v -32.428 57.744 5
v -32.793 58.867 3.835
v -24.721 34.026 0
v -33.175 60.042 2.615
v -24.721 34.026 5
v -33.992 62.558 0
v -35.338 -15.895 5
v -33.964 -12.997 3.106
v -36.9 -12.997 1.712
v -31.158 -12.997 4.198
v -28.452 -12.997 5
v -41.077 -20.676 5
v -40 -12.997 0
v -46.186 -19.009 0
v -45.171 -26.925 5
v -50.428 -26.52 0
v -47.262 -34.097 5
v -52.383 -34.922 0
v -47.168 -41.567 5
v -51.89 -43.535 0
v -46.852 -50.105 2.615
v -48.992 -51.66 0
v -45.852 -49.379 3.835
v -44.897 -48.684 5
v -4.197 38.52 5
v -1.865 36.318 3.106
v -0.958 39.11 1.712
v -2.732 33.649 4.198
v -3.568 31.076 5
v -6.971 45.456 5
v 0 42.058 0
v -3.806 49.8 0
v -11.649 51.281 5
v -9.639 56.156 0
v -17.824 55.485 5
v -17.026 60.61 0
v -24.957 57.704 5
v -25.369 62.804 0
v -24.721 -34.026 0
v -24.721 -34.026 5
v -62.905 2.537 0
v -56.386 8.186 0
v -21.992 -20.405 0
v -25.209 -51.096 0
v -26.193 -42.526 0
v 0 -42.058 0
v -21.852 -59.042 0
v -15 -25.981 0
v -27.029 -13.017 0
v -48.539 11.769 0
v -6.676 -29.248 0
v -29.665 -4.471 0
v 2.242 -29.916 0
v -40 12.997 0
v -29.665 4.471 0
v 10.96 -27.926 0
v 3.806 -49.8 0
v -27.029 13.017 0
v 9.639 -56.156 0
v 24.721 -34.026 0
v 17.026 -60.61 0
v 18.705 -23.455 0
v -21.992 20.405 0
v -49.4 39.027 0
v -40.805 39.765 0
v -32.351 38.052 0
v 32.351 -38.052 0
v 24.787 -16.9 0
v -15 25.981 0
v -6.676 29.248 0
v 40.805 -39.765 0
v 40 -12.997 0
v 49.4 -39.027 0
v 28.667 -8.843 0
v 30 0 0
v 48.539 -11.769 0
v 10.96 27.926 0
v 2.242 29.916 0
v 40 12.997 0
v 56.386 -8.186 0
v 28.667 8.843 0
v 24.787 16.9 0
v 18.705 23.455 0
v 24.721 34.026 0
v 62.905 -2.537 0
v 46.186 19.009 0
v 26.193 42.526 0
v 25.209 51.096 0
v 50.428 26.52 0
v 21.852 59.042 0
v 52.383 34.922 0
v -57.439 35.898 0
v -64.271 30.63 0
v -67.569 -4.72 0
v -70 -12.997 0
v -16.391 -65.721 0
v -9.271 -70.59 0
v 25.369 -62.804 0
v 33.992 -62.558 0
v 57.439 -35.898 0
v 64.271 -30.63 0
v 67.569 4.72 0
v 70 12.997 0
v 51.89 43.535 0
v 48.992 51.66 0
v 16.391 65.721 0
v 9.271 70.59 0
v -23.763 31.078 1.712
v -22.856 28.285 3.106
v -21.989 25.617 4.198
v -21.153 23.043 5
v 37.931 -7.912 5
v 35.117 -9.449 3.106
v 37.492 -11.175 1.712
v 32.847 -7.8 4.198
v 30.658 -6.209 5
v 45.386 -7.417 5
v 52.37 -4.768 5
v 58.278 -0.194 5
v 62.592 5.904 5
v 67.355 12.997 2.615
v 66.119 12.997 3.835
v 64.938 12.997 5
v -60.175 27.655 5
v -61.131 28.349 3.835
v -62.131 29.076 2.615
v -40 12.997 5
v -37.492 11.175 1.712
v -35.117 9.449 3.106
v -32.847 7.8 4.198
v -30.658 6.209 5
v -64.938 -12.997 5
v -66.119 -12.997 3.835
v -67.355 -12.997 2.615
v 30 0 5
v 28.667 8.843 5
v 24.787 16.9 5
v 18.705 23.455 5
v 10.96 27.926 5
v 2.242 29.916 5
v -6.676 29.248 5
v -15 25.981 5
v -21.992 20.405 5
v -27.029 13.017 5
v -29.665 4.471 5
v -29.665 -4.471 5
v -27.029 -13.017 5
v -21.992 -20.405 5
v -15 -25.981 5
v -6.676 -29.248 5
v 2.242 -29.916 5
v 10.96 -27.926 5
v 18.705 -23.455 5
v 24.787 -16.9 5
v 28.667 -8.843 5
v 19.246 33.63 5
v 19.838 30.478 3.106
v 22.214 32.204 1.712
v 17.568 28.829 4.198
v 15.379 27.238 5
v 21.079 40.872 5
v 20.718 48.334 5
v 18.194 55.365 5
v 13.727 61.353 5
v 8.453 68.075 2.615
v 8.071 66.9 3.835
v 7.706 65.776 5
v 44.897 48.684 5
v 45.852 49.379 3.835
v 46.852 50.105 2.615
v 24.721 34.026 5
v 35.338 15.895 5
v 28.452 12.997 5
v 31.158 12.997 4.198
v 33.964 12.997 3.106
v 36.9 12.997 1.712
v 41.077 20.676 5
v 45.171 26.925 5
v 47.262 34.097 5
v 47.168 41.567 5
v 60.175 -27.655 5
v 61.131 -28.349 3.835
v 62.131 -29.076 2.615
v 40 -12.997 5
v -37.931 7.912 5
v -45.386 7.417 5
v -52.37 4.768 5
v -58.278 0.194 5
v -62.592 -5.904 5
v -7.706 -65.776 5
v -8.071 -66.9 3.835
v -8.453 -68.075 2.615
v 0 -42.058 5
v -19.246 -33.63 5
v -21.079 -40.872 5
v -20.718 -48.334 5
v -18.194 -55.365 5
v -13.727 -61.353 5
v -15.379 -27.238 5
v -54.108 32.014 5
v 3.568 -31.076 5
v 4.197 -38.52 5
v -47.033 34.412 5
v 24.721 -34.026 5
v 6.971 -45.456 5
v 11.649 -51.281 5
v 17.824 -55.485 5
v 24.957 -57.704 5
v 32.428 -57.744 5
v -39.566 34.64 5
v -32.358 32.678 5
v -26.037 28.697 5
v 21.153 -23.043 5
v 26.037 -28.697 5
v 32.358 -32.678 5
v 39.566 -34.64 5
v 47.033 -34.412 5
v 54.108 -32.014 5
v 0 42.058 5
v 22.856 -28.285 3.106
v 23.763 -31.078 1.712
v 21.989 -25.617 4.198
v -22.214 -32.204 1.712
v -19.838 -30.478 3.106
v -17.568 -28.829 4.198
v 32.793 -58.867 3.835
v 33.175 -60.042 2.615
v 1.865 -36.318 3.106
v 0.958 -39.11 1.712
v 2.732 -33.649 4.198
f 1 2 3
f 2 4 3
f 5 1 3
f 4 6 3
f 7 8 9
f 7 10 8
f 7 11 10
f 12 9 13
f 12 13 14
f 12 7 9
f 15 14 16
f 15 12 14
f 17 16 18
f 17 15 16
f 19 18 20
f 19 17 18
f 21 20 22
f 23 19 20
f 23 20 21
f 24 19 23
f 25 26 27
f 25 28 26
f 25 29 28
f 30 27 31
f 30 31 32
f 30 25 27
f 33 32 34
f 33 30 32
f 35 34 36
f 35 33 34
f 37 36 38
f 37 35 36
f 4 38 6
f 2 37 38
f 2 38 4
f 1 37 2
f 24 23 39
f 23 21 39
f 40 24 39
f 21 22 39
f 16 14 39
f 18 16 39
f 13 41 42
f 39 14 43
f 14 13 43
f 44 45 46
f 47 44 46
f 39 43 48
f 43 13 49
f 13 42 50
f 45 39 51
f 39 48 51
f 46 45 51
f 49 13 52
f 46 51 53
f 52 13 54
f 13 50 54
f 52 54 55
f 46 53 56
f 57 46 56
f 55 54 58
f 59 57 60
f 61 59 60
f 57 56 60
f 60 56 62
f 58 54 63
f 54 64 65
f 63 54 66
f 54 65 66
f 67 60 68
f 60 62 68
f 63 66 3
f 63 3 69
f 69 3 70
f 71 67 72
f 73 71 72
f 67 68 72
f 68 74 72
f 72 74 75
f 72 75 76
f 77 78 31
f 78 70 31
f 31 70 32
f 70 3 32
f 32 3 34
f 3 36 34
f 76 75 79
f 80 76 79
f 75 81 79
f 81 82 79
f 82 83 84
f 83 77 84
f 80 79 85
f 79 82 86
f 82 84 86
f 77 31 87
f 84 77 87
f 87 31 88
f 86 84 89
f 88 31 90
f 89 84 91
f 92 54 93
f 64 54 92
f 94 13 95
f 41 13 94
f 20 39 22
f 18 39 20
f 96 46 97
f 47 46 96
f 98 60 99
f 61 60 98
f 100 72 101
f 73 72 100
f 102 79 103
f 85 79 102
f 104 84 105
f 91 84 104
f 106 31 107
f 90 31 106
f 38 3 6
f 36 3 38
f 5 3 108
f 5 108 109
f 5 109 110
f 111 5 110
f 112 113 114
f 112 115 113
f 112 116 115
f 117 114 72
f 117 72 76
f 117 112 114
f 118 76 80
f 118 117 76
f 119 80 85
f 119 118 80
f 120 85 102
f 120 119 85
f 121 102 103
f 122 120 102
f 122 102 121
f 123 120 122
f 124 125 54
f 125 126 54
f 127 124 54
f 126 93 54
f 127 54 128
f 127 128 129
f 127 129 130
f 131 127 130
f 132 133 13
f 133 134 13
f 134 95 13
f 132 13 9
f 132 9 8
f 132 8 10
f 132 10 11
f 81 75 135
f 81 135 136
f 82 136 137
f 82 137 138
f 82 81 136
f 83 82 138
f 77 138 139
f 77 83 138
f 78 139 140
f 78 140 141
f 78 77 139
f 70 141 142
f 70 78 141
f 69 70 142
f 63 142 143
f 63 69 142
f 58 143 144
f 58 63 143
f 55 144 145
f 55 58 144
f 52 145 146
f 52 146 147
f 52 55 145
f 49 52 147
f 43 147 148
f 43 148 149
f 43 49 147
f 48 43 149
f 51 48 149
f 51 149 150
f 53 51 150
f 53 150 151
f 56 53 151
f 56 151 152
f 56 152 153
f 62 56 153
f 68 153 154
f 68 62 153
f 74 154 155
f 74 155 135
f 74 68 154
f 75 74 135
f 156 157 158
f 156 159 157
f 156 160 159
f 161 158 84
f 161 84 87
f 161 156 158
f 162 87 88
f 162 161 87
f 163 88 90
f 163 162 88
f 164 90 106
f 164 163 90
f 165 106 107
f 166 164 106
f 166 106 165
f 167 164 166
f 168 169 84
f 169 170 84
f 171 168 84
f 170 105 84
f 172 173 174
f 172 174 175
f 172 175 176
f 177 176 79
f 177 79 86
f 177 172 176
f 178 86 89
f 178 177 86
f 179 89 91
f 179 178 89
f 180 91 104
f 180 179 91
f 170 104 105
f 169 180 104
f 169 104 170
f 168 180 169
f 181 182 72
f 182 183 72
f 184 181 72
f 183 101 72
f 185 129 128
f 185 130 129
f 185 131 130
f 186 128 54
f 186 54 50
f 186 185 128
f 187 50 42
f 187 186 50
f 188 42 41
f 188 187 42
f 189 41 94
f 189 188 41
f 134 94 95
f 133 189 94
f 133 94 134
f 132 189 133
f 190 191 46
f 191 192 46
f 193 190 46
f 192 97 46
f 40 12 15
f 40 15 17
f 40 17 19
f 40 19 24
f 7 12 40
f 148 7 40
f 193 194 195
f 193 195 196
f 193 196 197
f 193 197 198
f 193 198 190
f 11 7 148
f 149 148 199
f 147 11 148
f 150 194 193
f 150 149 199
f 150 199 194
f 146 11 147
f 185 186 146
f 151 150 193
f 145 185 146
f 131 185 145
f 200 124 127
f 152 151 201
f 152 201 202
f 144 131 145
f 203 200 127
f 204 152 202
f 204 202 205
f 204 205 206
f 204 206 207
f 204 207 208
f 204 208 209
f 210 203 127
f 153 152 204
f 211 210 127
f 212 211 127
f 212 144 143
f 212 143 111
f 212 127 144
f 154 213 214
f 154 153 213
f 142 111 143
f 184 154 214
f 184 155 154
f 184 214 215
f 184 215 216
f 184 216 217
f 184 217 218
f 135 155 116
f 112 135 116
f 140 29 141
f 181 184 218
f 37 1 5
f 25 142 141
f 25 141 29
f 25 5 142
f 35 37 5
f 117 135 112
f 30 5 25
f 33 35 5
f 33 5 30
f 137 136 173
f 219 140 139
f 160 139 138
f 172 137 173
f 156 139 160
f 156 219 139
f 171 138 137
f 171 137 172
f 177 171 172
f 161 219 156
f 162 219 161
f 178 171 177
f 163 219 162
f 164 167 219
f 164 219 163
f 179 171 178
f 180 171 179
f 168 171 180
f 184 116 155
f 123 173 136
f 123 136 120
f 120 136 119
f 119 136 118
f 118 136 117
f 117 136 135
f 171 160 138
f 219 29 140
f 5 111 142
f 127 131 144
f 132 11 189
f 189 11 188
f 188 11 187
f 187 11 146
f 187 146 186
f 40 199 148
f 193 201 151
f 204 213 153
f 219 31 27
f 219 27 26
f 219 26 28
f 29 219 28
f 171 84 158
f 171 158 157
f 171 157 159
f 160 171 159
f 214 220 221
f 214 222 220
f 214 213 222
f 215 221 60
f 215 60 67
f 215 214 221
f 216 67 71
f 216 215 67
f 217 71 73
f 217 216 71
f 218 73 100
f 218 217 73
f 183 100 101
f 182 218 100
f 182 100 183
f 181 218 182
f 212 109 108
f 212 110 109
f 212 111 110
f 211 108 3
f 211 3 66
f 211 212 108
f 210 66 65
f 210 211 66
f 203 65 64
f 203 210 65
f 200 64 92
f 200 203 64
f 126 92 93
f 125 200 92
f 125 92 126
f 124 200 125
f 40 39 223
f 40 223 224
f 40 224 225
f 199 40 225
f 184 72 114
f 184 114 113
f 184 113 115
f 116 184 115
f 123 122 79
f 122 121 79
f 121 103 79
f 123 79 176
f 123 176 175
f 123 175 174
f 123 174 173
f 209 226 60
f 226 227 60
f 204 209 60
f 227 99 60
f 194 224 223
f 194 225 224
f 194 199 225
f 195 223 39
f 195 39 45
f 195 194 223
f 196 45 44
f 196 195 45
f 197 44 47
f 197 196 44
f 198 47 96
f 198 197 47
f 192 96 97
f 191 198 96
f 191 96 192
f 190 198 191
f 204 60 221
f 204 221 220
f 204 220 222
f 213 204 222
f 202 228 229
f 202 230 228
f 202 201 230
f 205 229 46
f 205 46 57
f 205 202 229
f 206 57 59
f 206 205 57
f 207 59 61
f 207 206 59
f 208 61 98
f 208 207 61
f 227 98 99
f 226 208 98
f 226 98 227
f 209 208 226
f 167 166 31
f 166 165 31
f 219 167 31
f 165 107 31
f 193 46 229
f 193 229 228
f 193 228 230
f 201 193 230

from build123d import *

# Parameters (mm, degrees)
F0_R         = 30
F1_DEPTH     = 5
F2_T4_ANGLE  = 130.4484876855
F2_T9_ANGLE  = 130.4484876855
F2_T14_ANGLE = 130.4484876855
F2_T19_ANGLE = 130.4484876855
F2_T24_ANGLE = 130.4484876855
F2_T29_ANGLE = 130.4484876855
F2_T34_ANGLE = 130.4484876855
F2_T39_ANGLE = 130.4484876855
F2_T44_ANGLE = 130.4484876855
F2_T49_ANGLE = 130.4484876855


# Not quite as in the source:
# - a fillet or chamfer that OpenCascade refuses, or shapes differently, is made with other operations: its cross-section is extruded or revolved along the edge and cut away or added


with BuildPart() as f1:
    # F0 (on Top) → F1 (new body)
    with BuildSketch(Plane.XY):
        with BuildLine():
            Line((-40, 12.9967878493), (-24.72135955, 34.0260323341))
            ThreePointArc((-24.72135955, 34.0260323341), (-45.1291822893, 39.7035462239), (-64.2705098312, 30.6303454181))
            Line((-64.2705098312, 30.6303454181), (-40, 12.9967878493))
        make_face()
        Polygon((40, -12.9967878493), (40, 12.9967878493), (24.72135955, 34.0260323341), (0, 42.0584889695), (-24.72135955, 34.0260323341), (-40, 12.9967878493), (-40, -12.9967878493), (-24.72135955, -34.0260323341), (0, -42.0584889695), (24.72135955, -34.0260323341), align=None)
        Circle(F0_R, mode=Mode.SUBTRACT)
        with BuildLine():
            Line((-24.72135955, 34.0260323341), (0, 42.0584889695))
            ThreePointArc((0, 42.0584889695), (-13.1731164802, 58.6471114297), (-33.9918693812, 62.5577278229))
            Line((-33.9918693812, 62.5577278229), (-24.72135955, 34.0260323341))
        make_face()
        with BuildLine():
            Line((0, 42.0584889695), (24.72135955, 34.0260323341))
            ThreePointArc((24.72135955, 34.0260323341), (23.8146320866, 55.1894734115), (9.2705098312, 70.5901844584))
            Line((9.2705098312, 70.5901844584), (0, 42.0584889695))
        make_face()
        with BuildLine():
            Line((24.72135955, 34.0260323341), (40, 12.9967878493))
            ThreePointArc((40, 12.9967878493), (51.7060006259, 30.6513323712), (48.9918693812, 51.6595899029))
            Line((48.9918693812, 51.6595899029), (24.72135955, 34.0260323341))
        make_face()
        with BuildLine():
            Line((70, 12.9967878493), (40, 12.9967878493))
            Line((40, 12.9967878493), (40, -12.9967878493))
            ThreePointArc((40, -12.9967878493), (59.8474343484, -5.5945758344), (70, 12.9967878493))
        make_face()
        with BuildLine():
            Line((64.2705098312, -30.6303454181), (40, -12.9967878493))
            Line((40, -12.9967878493), (24.72135955, -34.0260323341))
            ThreePointArc((24.72135955, -34.0260323341), (45.1291822893, -39.7035462239), (64.2705098312, -30.6303454181))
        make_face()
        with BuildLine():
            Line((33.9918693812, -62.5577278229), (24.72135955, -34.0260323341))
            Line((24.72135955, -34.0260323341), (0, -42.0584889695))
            ThreePointArc((0, -42.0584889695), (13.1731164802, -58.6471114297), (33.9918693812, -62.5577278229))
        make_face()
        with BuildLine():
            Line((-9.2705098312, -70.5901844584), (0, -42.0584889695))
            Line((0, -42.0584889695), (-24.72135955, -34.0260323341))
            ThreePointArc((-24.72135955, -34.0260323341), (-23.8146320866, -55.1894734115), (-9.2705098312, -70.5901844584))
        make_face()
        with BuildLine():
            Line((-48.9918693812, -51.6595899029), (-24.72135955, -34.0260323341))
            Line((-24.72135955, -34.0260323341), (-40, -12.9967878493))
            ThreePointArc((-40, -12.9967878493), (-51.7060006259, -30.6513323712), (-48.9918693812, -51.6595899029))
        make_face()
        with BuildLine():
            Line((-40, -12.9967878493), (-40, 12.9967878493))
            ThreePointArc((-40, 12.9967878493), (-59.8474343484, 5.5945758344), (-70, -12.9967878493))
            Line((-70, -12.9967878493), (-40, -12.9967878493))
        make_face()
    extrude(amount=F1_DEPTH)

    # F2: chamfer of 5 on 10 edges, made by hand


with BuildPart() as f2_tool2:
    # F2_s3 → F2_t4 (revolve)
    with BuildSketch(Plane(origin=(-19.7412033785, -21.6824721062, 0), x_dir=(0, 0, 1), z_dir=(0.6732302342, 0.7394329258, 0))):
        Polygon((0, 1.9388571331), (5, 6.9388571331), (5, 1.9388571331), align=None)
    revolve(axis=Axis((4.103379024, -43.3922083566, 5), (0, 0, 1)), revolution_arc=F2_T4_ANGLE)

    split(bisect_by=Plane(origin=(7.639320225, -10.5146222424, 0), x_dir=(0, 0, 1), z_dir=(0.5877852523, -0.8090169944, 0)), keep=Keep.TOP)


with BuildPart() as f1_1:
    add(f1.part)

    # F2_t1: cut F2_tool2
    add(f2_tool2.part, mode=Mode.SUBTRACT)


with BuildPart() as f2_tool7:
    # F2_s8 → F2_t9 (revolve)
    with BuildSketch(Plane(origin=(-28.7156063599, -5.9379002056, 0), x_dir=(0, 0, 1), z_dir=(0.9792824694, 0.2024990002, 0))):
        Polygon((0, 1.9388571331), (5, 6.9388571331), (5, 1.9388571331), align=None)
    revolve(axis=Axis((-22.1855967717, -37.5169396588, 5), (0, 0, 1)), revolution_arc=F2_T9_ANGLE)

    split(bisect_by=Plane.XZ.offset(12.9967878493), keep=Keep.TOP)


with BuildPart() as f1_2:
    add(f1_1.part)

    # F2_t6: cut F2_tool7
    add(f2_tool7.part, mode=Mode.SUBTRACT)


with BuildPart() as f2_tool12:
    # F2_s13 → F2_t14 (revolve)
    with BuildSketch(Plane(origin=(-26.7216237194, 12.0747477518, 0), x_dir=(0, 0, 1), z_dir=(0.911282086, -0.4117826609, 0))):
        Polygon((0, 1.9388571331), (5, 6.9388571331), (5, 1.9388571331), align=None)
    revolve(axis=Axis((-40.0004286612, -17.3114751652, 5), (0, 0, 1)), revolution_arc=F2_T14_ANGLE)

    split(bisect_by=Plane(origin=(-7.639320225, -10.5146222424, 0), x_dir=(0, 0, 1), z_dir=(-0.5877852523, -0.8090169944, 0)), keep=Keep.TOP)


with BuildPart() as f1_3:
    add(f1_2.part)

    # F2_t11: cut F2_tool12
    add(f2_tool12.part, mode=Mode.SUBTRACT)


with BuildPart() as f2_tool17:
    # F2_s18 → F2_t19 (revolve)
    with BuildSketch(Plane(origin=(-14.5208890526, 25.4752524735, 0), x_dir=(0, 0, 1), z_dir=(0.495202919, -0.8687773415, 0))):
        Polygon((0, 1.9388571331), (5, 6.9388571331), (5, 1.9388571331), align=None)
    revolve(axis=Axis((-42.5364563668, 9.5063844461, 5), (0, 0, 1)), revolution_arc=F2_T19_ANGLE)

    split(bisect_by=Plane(origin=(-12.360679775, -4.0162283177, 0), x_dir=(0, 0, 1), z_dir=(-0.9510565163, -0.3090169944, 0)), keep=Keep.TOP)


with BuildPart() as f1_4:
    add(f1_3.part)

    # F2_t16: cut F2_tool17
    add(f2_tool17.part, mode=Mode.SUBTRACT)


with BuildPart() as f2_tool22:
    # F2_s23 → F2_t24 (revolve)
    with BuildSketch(Plane(origin=(3.2263316853, 29.1450766224, 0), x_dir=(0, 0, 1), z_dir=(-0.1100269317, -0.9939286062, 0))):
        Polygon((0, 1.9388571331), (5, 6.9388571331), (5, 1.9388571331), align=None)
    revolve(axis=Axis((-28.8250035012, 32.6931283091, 5), (0, 0, 1)), revolution_arc=F2_T24_ANGLE)

    split(bisect_by=Plane(origin=(-12.360679775, 4.0162283177, 0), x_dir=(0, 0, 1), z_dir=(-0.9510565163, 0.3090169944, 0)), keep=Keep.TOP)


with BuildPart() as f1_5:
    add(f1_4.part)

    # F2_t21: cut F2_tool22
    add(f2_tool22.part, mode=Mode.SUBTRACT)


with BuildPart() as f2_tool27:
    # F2_s28 → F2_t29 (revolve)
    with BuildSketch(Plane(origin=(19.7412033785, 21.6824721062, 0), x_dir=(0, 0, 1), z_dir=(-0.6732302342, -0.7394329258, 0))):
        Polygon((0, 1.9388571331), (5, 6.9388571331), (5, 1.9388571331), align=None)
    revolve(axis=Axis((-4.103379024, 43.3922083566, 5), (0, 0, 1)), revolution_arc=F2_T29_ANGLE)

    split(bisect_by=Plane(origin=(-7.639320225, 10.5146222424, 0), x_dir=(0, 0, 1), z_dir=(-0.5877852523, 0.8090169944, 0)), keep=Keep.TOP)


with BuildPart() as f1_6:
    add(f1_5.part)

    # F2_t26: cut F2_tool27
    add(f2_tool27.part, mode=Mode.SUBTRACT)


with BuildPart() as f2_tool32:
    # F2_s33 → F2_t34 (revolve)
    with BuildSketch(Plane(origin=(28.7156063599, 5.9379002056, 0), x_dir=(0, 0, 1), z_dir=(-0.9792824694, -0.2024990002, 0))):
        Polygon((0, 1.9388571331), (5, 6.9388571331), (5, 1.9388571331), align=None)
    revolve(axis=Axis((22.1855967717, 37.5169396588, 5), (0, 0, 1)), revolution_arc=F2_T34_ANGLE)

    split(bisect_by=Plane.XZ.offset(-12.9967878493), keep=Keep.BOTTOM)


with BuildPart() as f1_7:
    add(f1_6.part)

    # F2_t31: cut F2_tool32
    add(f2_tool32.part, mode=Mode.SUBTRACT)


with BuildPart() as f2_tool37:
    # F2_s38 → F2_t39 (revolve)
    with BuildSketch(Plane(origin=(26.7216237194, -12.0747477518, 0), x_dir=(0, 0, 1), z_dir=(-0.911282086, 0.4117826609, 0))):
        Polygon((0, 1.9388571331), (5, 6.9388571331), (5, 1.9388571331), align=None)
    revolve(axis=Axis((40.0004286612, 17.3114751652, 5), (0, 0, 1)), revolution_arc=F2_T39_ANGLE)

    split(bisect_by=Plane(origin=(7.639320225, 10.5146222424, 0), x_dir=(0, 0, 1), z_dir=(0.5877852523, 0.8090169944, 0)), keep=Keep.TOP)


with BuildPart() as f1_8:
    add(f1_7.part)

    # F2_t36: cut F2_tool37
    add(f2_tool37.part, mode=Mode.SUBTRACT)


with BuildPart() as f2_tool42:
    # F2_s43 → F2_t44 (revolve)
    with BuildSketch(Plane(origin=(14.5208890526, -25.4752524735, 0), x_dir=(0, 0, 1), z_dir=(-0.495202919, 0.8687773415, 0))):
        Polygon((0, 1.9388571331), (5, 6.9388571331), (5, 1.9388571331), align=None)
    revolve(axis=Axis((42.5364563668, -9.5063844461, 5), (0, 0, 1)), revolution_arc=F2_T44_ANGLE)

    split(bisect_by=Plane(origin=(12.360679775, 4.0162283177, 0), x_dir=(0, 0, 1), z_dir=(0.9510565163, 0.3090169944, 0)), keep=Keep.TOP)


with BuildPart() as f1_9:
    add(f1_8.part)

    # F2_t41: cut F2_tool42
    add(f2_tool42.part, mode=Mode.SUBTRACT)


with BuildPart() as f2_tool47:
    # F2_s48 → F2_t49 (revolve)
    with BuildSketch(Plane(origin=(-3.2263316853, -29.1450766224, 0), x_dir=(0, 0, 1), z_dir=(0.1100269317, 0.9939286062, 0))):
        Polygon((0, 1.9388571331), (5, 6.9388571331), (5, 1.9388571331), align=None)
    revolve(axis=Axis((28.8250035012, -32.6931283091, 5), (0, 0, 1)), revolution_arc=F2_T49_ANGLE)

    split(bisect_by=Plane(origin=(12.360679775, -4.0162283177, 0), x_dir=(0, 0, 1), z_dir=(0.9510565163, -0.3090169944, 0)), keep=Keep.TOP)


with BuildPart() as f1_10:
    add(f1_9.part)

    # F2_t46: cut F2_tool47
    add(f2_tool47.part, mode=Mode.SUBTRACT)


solid = f1_10.part
